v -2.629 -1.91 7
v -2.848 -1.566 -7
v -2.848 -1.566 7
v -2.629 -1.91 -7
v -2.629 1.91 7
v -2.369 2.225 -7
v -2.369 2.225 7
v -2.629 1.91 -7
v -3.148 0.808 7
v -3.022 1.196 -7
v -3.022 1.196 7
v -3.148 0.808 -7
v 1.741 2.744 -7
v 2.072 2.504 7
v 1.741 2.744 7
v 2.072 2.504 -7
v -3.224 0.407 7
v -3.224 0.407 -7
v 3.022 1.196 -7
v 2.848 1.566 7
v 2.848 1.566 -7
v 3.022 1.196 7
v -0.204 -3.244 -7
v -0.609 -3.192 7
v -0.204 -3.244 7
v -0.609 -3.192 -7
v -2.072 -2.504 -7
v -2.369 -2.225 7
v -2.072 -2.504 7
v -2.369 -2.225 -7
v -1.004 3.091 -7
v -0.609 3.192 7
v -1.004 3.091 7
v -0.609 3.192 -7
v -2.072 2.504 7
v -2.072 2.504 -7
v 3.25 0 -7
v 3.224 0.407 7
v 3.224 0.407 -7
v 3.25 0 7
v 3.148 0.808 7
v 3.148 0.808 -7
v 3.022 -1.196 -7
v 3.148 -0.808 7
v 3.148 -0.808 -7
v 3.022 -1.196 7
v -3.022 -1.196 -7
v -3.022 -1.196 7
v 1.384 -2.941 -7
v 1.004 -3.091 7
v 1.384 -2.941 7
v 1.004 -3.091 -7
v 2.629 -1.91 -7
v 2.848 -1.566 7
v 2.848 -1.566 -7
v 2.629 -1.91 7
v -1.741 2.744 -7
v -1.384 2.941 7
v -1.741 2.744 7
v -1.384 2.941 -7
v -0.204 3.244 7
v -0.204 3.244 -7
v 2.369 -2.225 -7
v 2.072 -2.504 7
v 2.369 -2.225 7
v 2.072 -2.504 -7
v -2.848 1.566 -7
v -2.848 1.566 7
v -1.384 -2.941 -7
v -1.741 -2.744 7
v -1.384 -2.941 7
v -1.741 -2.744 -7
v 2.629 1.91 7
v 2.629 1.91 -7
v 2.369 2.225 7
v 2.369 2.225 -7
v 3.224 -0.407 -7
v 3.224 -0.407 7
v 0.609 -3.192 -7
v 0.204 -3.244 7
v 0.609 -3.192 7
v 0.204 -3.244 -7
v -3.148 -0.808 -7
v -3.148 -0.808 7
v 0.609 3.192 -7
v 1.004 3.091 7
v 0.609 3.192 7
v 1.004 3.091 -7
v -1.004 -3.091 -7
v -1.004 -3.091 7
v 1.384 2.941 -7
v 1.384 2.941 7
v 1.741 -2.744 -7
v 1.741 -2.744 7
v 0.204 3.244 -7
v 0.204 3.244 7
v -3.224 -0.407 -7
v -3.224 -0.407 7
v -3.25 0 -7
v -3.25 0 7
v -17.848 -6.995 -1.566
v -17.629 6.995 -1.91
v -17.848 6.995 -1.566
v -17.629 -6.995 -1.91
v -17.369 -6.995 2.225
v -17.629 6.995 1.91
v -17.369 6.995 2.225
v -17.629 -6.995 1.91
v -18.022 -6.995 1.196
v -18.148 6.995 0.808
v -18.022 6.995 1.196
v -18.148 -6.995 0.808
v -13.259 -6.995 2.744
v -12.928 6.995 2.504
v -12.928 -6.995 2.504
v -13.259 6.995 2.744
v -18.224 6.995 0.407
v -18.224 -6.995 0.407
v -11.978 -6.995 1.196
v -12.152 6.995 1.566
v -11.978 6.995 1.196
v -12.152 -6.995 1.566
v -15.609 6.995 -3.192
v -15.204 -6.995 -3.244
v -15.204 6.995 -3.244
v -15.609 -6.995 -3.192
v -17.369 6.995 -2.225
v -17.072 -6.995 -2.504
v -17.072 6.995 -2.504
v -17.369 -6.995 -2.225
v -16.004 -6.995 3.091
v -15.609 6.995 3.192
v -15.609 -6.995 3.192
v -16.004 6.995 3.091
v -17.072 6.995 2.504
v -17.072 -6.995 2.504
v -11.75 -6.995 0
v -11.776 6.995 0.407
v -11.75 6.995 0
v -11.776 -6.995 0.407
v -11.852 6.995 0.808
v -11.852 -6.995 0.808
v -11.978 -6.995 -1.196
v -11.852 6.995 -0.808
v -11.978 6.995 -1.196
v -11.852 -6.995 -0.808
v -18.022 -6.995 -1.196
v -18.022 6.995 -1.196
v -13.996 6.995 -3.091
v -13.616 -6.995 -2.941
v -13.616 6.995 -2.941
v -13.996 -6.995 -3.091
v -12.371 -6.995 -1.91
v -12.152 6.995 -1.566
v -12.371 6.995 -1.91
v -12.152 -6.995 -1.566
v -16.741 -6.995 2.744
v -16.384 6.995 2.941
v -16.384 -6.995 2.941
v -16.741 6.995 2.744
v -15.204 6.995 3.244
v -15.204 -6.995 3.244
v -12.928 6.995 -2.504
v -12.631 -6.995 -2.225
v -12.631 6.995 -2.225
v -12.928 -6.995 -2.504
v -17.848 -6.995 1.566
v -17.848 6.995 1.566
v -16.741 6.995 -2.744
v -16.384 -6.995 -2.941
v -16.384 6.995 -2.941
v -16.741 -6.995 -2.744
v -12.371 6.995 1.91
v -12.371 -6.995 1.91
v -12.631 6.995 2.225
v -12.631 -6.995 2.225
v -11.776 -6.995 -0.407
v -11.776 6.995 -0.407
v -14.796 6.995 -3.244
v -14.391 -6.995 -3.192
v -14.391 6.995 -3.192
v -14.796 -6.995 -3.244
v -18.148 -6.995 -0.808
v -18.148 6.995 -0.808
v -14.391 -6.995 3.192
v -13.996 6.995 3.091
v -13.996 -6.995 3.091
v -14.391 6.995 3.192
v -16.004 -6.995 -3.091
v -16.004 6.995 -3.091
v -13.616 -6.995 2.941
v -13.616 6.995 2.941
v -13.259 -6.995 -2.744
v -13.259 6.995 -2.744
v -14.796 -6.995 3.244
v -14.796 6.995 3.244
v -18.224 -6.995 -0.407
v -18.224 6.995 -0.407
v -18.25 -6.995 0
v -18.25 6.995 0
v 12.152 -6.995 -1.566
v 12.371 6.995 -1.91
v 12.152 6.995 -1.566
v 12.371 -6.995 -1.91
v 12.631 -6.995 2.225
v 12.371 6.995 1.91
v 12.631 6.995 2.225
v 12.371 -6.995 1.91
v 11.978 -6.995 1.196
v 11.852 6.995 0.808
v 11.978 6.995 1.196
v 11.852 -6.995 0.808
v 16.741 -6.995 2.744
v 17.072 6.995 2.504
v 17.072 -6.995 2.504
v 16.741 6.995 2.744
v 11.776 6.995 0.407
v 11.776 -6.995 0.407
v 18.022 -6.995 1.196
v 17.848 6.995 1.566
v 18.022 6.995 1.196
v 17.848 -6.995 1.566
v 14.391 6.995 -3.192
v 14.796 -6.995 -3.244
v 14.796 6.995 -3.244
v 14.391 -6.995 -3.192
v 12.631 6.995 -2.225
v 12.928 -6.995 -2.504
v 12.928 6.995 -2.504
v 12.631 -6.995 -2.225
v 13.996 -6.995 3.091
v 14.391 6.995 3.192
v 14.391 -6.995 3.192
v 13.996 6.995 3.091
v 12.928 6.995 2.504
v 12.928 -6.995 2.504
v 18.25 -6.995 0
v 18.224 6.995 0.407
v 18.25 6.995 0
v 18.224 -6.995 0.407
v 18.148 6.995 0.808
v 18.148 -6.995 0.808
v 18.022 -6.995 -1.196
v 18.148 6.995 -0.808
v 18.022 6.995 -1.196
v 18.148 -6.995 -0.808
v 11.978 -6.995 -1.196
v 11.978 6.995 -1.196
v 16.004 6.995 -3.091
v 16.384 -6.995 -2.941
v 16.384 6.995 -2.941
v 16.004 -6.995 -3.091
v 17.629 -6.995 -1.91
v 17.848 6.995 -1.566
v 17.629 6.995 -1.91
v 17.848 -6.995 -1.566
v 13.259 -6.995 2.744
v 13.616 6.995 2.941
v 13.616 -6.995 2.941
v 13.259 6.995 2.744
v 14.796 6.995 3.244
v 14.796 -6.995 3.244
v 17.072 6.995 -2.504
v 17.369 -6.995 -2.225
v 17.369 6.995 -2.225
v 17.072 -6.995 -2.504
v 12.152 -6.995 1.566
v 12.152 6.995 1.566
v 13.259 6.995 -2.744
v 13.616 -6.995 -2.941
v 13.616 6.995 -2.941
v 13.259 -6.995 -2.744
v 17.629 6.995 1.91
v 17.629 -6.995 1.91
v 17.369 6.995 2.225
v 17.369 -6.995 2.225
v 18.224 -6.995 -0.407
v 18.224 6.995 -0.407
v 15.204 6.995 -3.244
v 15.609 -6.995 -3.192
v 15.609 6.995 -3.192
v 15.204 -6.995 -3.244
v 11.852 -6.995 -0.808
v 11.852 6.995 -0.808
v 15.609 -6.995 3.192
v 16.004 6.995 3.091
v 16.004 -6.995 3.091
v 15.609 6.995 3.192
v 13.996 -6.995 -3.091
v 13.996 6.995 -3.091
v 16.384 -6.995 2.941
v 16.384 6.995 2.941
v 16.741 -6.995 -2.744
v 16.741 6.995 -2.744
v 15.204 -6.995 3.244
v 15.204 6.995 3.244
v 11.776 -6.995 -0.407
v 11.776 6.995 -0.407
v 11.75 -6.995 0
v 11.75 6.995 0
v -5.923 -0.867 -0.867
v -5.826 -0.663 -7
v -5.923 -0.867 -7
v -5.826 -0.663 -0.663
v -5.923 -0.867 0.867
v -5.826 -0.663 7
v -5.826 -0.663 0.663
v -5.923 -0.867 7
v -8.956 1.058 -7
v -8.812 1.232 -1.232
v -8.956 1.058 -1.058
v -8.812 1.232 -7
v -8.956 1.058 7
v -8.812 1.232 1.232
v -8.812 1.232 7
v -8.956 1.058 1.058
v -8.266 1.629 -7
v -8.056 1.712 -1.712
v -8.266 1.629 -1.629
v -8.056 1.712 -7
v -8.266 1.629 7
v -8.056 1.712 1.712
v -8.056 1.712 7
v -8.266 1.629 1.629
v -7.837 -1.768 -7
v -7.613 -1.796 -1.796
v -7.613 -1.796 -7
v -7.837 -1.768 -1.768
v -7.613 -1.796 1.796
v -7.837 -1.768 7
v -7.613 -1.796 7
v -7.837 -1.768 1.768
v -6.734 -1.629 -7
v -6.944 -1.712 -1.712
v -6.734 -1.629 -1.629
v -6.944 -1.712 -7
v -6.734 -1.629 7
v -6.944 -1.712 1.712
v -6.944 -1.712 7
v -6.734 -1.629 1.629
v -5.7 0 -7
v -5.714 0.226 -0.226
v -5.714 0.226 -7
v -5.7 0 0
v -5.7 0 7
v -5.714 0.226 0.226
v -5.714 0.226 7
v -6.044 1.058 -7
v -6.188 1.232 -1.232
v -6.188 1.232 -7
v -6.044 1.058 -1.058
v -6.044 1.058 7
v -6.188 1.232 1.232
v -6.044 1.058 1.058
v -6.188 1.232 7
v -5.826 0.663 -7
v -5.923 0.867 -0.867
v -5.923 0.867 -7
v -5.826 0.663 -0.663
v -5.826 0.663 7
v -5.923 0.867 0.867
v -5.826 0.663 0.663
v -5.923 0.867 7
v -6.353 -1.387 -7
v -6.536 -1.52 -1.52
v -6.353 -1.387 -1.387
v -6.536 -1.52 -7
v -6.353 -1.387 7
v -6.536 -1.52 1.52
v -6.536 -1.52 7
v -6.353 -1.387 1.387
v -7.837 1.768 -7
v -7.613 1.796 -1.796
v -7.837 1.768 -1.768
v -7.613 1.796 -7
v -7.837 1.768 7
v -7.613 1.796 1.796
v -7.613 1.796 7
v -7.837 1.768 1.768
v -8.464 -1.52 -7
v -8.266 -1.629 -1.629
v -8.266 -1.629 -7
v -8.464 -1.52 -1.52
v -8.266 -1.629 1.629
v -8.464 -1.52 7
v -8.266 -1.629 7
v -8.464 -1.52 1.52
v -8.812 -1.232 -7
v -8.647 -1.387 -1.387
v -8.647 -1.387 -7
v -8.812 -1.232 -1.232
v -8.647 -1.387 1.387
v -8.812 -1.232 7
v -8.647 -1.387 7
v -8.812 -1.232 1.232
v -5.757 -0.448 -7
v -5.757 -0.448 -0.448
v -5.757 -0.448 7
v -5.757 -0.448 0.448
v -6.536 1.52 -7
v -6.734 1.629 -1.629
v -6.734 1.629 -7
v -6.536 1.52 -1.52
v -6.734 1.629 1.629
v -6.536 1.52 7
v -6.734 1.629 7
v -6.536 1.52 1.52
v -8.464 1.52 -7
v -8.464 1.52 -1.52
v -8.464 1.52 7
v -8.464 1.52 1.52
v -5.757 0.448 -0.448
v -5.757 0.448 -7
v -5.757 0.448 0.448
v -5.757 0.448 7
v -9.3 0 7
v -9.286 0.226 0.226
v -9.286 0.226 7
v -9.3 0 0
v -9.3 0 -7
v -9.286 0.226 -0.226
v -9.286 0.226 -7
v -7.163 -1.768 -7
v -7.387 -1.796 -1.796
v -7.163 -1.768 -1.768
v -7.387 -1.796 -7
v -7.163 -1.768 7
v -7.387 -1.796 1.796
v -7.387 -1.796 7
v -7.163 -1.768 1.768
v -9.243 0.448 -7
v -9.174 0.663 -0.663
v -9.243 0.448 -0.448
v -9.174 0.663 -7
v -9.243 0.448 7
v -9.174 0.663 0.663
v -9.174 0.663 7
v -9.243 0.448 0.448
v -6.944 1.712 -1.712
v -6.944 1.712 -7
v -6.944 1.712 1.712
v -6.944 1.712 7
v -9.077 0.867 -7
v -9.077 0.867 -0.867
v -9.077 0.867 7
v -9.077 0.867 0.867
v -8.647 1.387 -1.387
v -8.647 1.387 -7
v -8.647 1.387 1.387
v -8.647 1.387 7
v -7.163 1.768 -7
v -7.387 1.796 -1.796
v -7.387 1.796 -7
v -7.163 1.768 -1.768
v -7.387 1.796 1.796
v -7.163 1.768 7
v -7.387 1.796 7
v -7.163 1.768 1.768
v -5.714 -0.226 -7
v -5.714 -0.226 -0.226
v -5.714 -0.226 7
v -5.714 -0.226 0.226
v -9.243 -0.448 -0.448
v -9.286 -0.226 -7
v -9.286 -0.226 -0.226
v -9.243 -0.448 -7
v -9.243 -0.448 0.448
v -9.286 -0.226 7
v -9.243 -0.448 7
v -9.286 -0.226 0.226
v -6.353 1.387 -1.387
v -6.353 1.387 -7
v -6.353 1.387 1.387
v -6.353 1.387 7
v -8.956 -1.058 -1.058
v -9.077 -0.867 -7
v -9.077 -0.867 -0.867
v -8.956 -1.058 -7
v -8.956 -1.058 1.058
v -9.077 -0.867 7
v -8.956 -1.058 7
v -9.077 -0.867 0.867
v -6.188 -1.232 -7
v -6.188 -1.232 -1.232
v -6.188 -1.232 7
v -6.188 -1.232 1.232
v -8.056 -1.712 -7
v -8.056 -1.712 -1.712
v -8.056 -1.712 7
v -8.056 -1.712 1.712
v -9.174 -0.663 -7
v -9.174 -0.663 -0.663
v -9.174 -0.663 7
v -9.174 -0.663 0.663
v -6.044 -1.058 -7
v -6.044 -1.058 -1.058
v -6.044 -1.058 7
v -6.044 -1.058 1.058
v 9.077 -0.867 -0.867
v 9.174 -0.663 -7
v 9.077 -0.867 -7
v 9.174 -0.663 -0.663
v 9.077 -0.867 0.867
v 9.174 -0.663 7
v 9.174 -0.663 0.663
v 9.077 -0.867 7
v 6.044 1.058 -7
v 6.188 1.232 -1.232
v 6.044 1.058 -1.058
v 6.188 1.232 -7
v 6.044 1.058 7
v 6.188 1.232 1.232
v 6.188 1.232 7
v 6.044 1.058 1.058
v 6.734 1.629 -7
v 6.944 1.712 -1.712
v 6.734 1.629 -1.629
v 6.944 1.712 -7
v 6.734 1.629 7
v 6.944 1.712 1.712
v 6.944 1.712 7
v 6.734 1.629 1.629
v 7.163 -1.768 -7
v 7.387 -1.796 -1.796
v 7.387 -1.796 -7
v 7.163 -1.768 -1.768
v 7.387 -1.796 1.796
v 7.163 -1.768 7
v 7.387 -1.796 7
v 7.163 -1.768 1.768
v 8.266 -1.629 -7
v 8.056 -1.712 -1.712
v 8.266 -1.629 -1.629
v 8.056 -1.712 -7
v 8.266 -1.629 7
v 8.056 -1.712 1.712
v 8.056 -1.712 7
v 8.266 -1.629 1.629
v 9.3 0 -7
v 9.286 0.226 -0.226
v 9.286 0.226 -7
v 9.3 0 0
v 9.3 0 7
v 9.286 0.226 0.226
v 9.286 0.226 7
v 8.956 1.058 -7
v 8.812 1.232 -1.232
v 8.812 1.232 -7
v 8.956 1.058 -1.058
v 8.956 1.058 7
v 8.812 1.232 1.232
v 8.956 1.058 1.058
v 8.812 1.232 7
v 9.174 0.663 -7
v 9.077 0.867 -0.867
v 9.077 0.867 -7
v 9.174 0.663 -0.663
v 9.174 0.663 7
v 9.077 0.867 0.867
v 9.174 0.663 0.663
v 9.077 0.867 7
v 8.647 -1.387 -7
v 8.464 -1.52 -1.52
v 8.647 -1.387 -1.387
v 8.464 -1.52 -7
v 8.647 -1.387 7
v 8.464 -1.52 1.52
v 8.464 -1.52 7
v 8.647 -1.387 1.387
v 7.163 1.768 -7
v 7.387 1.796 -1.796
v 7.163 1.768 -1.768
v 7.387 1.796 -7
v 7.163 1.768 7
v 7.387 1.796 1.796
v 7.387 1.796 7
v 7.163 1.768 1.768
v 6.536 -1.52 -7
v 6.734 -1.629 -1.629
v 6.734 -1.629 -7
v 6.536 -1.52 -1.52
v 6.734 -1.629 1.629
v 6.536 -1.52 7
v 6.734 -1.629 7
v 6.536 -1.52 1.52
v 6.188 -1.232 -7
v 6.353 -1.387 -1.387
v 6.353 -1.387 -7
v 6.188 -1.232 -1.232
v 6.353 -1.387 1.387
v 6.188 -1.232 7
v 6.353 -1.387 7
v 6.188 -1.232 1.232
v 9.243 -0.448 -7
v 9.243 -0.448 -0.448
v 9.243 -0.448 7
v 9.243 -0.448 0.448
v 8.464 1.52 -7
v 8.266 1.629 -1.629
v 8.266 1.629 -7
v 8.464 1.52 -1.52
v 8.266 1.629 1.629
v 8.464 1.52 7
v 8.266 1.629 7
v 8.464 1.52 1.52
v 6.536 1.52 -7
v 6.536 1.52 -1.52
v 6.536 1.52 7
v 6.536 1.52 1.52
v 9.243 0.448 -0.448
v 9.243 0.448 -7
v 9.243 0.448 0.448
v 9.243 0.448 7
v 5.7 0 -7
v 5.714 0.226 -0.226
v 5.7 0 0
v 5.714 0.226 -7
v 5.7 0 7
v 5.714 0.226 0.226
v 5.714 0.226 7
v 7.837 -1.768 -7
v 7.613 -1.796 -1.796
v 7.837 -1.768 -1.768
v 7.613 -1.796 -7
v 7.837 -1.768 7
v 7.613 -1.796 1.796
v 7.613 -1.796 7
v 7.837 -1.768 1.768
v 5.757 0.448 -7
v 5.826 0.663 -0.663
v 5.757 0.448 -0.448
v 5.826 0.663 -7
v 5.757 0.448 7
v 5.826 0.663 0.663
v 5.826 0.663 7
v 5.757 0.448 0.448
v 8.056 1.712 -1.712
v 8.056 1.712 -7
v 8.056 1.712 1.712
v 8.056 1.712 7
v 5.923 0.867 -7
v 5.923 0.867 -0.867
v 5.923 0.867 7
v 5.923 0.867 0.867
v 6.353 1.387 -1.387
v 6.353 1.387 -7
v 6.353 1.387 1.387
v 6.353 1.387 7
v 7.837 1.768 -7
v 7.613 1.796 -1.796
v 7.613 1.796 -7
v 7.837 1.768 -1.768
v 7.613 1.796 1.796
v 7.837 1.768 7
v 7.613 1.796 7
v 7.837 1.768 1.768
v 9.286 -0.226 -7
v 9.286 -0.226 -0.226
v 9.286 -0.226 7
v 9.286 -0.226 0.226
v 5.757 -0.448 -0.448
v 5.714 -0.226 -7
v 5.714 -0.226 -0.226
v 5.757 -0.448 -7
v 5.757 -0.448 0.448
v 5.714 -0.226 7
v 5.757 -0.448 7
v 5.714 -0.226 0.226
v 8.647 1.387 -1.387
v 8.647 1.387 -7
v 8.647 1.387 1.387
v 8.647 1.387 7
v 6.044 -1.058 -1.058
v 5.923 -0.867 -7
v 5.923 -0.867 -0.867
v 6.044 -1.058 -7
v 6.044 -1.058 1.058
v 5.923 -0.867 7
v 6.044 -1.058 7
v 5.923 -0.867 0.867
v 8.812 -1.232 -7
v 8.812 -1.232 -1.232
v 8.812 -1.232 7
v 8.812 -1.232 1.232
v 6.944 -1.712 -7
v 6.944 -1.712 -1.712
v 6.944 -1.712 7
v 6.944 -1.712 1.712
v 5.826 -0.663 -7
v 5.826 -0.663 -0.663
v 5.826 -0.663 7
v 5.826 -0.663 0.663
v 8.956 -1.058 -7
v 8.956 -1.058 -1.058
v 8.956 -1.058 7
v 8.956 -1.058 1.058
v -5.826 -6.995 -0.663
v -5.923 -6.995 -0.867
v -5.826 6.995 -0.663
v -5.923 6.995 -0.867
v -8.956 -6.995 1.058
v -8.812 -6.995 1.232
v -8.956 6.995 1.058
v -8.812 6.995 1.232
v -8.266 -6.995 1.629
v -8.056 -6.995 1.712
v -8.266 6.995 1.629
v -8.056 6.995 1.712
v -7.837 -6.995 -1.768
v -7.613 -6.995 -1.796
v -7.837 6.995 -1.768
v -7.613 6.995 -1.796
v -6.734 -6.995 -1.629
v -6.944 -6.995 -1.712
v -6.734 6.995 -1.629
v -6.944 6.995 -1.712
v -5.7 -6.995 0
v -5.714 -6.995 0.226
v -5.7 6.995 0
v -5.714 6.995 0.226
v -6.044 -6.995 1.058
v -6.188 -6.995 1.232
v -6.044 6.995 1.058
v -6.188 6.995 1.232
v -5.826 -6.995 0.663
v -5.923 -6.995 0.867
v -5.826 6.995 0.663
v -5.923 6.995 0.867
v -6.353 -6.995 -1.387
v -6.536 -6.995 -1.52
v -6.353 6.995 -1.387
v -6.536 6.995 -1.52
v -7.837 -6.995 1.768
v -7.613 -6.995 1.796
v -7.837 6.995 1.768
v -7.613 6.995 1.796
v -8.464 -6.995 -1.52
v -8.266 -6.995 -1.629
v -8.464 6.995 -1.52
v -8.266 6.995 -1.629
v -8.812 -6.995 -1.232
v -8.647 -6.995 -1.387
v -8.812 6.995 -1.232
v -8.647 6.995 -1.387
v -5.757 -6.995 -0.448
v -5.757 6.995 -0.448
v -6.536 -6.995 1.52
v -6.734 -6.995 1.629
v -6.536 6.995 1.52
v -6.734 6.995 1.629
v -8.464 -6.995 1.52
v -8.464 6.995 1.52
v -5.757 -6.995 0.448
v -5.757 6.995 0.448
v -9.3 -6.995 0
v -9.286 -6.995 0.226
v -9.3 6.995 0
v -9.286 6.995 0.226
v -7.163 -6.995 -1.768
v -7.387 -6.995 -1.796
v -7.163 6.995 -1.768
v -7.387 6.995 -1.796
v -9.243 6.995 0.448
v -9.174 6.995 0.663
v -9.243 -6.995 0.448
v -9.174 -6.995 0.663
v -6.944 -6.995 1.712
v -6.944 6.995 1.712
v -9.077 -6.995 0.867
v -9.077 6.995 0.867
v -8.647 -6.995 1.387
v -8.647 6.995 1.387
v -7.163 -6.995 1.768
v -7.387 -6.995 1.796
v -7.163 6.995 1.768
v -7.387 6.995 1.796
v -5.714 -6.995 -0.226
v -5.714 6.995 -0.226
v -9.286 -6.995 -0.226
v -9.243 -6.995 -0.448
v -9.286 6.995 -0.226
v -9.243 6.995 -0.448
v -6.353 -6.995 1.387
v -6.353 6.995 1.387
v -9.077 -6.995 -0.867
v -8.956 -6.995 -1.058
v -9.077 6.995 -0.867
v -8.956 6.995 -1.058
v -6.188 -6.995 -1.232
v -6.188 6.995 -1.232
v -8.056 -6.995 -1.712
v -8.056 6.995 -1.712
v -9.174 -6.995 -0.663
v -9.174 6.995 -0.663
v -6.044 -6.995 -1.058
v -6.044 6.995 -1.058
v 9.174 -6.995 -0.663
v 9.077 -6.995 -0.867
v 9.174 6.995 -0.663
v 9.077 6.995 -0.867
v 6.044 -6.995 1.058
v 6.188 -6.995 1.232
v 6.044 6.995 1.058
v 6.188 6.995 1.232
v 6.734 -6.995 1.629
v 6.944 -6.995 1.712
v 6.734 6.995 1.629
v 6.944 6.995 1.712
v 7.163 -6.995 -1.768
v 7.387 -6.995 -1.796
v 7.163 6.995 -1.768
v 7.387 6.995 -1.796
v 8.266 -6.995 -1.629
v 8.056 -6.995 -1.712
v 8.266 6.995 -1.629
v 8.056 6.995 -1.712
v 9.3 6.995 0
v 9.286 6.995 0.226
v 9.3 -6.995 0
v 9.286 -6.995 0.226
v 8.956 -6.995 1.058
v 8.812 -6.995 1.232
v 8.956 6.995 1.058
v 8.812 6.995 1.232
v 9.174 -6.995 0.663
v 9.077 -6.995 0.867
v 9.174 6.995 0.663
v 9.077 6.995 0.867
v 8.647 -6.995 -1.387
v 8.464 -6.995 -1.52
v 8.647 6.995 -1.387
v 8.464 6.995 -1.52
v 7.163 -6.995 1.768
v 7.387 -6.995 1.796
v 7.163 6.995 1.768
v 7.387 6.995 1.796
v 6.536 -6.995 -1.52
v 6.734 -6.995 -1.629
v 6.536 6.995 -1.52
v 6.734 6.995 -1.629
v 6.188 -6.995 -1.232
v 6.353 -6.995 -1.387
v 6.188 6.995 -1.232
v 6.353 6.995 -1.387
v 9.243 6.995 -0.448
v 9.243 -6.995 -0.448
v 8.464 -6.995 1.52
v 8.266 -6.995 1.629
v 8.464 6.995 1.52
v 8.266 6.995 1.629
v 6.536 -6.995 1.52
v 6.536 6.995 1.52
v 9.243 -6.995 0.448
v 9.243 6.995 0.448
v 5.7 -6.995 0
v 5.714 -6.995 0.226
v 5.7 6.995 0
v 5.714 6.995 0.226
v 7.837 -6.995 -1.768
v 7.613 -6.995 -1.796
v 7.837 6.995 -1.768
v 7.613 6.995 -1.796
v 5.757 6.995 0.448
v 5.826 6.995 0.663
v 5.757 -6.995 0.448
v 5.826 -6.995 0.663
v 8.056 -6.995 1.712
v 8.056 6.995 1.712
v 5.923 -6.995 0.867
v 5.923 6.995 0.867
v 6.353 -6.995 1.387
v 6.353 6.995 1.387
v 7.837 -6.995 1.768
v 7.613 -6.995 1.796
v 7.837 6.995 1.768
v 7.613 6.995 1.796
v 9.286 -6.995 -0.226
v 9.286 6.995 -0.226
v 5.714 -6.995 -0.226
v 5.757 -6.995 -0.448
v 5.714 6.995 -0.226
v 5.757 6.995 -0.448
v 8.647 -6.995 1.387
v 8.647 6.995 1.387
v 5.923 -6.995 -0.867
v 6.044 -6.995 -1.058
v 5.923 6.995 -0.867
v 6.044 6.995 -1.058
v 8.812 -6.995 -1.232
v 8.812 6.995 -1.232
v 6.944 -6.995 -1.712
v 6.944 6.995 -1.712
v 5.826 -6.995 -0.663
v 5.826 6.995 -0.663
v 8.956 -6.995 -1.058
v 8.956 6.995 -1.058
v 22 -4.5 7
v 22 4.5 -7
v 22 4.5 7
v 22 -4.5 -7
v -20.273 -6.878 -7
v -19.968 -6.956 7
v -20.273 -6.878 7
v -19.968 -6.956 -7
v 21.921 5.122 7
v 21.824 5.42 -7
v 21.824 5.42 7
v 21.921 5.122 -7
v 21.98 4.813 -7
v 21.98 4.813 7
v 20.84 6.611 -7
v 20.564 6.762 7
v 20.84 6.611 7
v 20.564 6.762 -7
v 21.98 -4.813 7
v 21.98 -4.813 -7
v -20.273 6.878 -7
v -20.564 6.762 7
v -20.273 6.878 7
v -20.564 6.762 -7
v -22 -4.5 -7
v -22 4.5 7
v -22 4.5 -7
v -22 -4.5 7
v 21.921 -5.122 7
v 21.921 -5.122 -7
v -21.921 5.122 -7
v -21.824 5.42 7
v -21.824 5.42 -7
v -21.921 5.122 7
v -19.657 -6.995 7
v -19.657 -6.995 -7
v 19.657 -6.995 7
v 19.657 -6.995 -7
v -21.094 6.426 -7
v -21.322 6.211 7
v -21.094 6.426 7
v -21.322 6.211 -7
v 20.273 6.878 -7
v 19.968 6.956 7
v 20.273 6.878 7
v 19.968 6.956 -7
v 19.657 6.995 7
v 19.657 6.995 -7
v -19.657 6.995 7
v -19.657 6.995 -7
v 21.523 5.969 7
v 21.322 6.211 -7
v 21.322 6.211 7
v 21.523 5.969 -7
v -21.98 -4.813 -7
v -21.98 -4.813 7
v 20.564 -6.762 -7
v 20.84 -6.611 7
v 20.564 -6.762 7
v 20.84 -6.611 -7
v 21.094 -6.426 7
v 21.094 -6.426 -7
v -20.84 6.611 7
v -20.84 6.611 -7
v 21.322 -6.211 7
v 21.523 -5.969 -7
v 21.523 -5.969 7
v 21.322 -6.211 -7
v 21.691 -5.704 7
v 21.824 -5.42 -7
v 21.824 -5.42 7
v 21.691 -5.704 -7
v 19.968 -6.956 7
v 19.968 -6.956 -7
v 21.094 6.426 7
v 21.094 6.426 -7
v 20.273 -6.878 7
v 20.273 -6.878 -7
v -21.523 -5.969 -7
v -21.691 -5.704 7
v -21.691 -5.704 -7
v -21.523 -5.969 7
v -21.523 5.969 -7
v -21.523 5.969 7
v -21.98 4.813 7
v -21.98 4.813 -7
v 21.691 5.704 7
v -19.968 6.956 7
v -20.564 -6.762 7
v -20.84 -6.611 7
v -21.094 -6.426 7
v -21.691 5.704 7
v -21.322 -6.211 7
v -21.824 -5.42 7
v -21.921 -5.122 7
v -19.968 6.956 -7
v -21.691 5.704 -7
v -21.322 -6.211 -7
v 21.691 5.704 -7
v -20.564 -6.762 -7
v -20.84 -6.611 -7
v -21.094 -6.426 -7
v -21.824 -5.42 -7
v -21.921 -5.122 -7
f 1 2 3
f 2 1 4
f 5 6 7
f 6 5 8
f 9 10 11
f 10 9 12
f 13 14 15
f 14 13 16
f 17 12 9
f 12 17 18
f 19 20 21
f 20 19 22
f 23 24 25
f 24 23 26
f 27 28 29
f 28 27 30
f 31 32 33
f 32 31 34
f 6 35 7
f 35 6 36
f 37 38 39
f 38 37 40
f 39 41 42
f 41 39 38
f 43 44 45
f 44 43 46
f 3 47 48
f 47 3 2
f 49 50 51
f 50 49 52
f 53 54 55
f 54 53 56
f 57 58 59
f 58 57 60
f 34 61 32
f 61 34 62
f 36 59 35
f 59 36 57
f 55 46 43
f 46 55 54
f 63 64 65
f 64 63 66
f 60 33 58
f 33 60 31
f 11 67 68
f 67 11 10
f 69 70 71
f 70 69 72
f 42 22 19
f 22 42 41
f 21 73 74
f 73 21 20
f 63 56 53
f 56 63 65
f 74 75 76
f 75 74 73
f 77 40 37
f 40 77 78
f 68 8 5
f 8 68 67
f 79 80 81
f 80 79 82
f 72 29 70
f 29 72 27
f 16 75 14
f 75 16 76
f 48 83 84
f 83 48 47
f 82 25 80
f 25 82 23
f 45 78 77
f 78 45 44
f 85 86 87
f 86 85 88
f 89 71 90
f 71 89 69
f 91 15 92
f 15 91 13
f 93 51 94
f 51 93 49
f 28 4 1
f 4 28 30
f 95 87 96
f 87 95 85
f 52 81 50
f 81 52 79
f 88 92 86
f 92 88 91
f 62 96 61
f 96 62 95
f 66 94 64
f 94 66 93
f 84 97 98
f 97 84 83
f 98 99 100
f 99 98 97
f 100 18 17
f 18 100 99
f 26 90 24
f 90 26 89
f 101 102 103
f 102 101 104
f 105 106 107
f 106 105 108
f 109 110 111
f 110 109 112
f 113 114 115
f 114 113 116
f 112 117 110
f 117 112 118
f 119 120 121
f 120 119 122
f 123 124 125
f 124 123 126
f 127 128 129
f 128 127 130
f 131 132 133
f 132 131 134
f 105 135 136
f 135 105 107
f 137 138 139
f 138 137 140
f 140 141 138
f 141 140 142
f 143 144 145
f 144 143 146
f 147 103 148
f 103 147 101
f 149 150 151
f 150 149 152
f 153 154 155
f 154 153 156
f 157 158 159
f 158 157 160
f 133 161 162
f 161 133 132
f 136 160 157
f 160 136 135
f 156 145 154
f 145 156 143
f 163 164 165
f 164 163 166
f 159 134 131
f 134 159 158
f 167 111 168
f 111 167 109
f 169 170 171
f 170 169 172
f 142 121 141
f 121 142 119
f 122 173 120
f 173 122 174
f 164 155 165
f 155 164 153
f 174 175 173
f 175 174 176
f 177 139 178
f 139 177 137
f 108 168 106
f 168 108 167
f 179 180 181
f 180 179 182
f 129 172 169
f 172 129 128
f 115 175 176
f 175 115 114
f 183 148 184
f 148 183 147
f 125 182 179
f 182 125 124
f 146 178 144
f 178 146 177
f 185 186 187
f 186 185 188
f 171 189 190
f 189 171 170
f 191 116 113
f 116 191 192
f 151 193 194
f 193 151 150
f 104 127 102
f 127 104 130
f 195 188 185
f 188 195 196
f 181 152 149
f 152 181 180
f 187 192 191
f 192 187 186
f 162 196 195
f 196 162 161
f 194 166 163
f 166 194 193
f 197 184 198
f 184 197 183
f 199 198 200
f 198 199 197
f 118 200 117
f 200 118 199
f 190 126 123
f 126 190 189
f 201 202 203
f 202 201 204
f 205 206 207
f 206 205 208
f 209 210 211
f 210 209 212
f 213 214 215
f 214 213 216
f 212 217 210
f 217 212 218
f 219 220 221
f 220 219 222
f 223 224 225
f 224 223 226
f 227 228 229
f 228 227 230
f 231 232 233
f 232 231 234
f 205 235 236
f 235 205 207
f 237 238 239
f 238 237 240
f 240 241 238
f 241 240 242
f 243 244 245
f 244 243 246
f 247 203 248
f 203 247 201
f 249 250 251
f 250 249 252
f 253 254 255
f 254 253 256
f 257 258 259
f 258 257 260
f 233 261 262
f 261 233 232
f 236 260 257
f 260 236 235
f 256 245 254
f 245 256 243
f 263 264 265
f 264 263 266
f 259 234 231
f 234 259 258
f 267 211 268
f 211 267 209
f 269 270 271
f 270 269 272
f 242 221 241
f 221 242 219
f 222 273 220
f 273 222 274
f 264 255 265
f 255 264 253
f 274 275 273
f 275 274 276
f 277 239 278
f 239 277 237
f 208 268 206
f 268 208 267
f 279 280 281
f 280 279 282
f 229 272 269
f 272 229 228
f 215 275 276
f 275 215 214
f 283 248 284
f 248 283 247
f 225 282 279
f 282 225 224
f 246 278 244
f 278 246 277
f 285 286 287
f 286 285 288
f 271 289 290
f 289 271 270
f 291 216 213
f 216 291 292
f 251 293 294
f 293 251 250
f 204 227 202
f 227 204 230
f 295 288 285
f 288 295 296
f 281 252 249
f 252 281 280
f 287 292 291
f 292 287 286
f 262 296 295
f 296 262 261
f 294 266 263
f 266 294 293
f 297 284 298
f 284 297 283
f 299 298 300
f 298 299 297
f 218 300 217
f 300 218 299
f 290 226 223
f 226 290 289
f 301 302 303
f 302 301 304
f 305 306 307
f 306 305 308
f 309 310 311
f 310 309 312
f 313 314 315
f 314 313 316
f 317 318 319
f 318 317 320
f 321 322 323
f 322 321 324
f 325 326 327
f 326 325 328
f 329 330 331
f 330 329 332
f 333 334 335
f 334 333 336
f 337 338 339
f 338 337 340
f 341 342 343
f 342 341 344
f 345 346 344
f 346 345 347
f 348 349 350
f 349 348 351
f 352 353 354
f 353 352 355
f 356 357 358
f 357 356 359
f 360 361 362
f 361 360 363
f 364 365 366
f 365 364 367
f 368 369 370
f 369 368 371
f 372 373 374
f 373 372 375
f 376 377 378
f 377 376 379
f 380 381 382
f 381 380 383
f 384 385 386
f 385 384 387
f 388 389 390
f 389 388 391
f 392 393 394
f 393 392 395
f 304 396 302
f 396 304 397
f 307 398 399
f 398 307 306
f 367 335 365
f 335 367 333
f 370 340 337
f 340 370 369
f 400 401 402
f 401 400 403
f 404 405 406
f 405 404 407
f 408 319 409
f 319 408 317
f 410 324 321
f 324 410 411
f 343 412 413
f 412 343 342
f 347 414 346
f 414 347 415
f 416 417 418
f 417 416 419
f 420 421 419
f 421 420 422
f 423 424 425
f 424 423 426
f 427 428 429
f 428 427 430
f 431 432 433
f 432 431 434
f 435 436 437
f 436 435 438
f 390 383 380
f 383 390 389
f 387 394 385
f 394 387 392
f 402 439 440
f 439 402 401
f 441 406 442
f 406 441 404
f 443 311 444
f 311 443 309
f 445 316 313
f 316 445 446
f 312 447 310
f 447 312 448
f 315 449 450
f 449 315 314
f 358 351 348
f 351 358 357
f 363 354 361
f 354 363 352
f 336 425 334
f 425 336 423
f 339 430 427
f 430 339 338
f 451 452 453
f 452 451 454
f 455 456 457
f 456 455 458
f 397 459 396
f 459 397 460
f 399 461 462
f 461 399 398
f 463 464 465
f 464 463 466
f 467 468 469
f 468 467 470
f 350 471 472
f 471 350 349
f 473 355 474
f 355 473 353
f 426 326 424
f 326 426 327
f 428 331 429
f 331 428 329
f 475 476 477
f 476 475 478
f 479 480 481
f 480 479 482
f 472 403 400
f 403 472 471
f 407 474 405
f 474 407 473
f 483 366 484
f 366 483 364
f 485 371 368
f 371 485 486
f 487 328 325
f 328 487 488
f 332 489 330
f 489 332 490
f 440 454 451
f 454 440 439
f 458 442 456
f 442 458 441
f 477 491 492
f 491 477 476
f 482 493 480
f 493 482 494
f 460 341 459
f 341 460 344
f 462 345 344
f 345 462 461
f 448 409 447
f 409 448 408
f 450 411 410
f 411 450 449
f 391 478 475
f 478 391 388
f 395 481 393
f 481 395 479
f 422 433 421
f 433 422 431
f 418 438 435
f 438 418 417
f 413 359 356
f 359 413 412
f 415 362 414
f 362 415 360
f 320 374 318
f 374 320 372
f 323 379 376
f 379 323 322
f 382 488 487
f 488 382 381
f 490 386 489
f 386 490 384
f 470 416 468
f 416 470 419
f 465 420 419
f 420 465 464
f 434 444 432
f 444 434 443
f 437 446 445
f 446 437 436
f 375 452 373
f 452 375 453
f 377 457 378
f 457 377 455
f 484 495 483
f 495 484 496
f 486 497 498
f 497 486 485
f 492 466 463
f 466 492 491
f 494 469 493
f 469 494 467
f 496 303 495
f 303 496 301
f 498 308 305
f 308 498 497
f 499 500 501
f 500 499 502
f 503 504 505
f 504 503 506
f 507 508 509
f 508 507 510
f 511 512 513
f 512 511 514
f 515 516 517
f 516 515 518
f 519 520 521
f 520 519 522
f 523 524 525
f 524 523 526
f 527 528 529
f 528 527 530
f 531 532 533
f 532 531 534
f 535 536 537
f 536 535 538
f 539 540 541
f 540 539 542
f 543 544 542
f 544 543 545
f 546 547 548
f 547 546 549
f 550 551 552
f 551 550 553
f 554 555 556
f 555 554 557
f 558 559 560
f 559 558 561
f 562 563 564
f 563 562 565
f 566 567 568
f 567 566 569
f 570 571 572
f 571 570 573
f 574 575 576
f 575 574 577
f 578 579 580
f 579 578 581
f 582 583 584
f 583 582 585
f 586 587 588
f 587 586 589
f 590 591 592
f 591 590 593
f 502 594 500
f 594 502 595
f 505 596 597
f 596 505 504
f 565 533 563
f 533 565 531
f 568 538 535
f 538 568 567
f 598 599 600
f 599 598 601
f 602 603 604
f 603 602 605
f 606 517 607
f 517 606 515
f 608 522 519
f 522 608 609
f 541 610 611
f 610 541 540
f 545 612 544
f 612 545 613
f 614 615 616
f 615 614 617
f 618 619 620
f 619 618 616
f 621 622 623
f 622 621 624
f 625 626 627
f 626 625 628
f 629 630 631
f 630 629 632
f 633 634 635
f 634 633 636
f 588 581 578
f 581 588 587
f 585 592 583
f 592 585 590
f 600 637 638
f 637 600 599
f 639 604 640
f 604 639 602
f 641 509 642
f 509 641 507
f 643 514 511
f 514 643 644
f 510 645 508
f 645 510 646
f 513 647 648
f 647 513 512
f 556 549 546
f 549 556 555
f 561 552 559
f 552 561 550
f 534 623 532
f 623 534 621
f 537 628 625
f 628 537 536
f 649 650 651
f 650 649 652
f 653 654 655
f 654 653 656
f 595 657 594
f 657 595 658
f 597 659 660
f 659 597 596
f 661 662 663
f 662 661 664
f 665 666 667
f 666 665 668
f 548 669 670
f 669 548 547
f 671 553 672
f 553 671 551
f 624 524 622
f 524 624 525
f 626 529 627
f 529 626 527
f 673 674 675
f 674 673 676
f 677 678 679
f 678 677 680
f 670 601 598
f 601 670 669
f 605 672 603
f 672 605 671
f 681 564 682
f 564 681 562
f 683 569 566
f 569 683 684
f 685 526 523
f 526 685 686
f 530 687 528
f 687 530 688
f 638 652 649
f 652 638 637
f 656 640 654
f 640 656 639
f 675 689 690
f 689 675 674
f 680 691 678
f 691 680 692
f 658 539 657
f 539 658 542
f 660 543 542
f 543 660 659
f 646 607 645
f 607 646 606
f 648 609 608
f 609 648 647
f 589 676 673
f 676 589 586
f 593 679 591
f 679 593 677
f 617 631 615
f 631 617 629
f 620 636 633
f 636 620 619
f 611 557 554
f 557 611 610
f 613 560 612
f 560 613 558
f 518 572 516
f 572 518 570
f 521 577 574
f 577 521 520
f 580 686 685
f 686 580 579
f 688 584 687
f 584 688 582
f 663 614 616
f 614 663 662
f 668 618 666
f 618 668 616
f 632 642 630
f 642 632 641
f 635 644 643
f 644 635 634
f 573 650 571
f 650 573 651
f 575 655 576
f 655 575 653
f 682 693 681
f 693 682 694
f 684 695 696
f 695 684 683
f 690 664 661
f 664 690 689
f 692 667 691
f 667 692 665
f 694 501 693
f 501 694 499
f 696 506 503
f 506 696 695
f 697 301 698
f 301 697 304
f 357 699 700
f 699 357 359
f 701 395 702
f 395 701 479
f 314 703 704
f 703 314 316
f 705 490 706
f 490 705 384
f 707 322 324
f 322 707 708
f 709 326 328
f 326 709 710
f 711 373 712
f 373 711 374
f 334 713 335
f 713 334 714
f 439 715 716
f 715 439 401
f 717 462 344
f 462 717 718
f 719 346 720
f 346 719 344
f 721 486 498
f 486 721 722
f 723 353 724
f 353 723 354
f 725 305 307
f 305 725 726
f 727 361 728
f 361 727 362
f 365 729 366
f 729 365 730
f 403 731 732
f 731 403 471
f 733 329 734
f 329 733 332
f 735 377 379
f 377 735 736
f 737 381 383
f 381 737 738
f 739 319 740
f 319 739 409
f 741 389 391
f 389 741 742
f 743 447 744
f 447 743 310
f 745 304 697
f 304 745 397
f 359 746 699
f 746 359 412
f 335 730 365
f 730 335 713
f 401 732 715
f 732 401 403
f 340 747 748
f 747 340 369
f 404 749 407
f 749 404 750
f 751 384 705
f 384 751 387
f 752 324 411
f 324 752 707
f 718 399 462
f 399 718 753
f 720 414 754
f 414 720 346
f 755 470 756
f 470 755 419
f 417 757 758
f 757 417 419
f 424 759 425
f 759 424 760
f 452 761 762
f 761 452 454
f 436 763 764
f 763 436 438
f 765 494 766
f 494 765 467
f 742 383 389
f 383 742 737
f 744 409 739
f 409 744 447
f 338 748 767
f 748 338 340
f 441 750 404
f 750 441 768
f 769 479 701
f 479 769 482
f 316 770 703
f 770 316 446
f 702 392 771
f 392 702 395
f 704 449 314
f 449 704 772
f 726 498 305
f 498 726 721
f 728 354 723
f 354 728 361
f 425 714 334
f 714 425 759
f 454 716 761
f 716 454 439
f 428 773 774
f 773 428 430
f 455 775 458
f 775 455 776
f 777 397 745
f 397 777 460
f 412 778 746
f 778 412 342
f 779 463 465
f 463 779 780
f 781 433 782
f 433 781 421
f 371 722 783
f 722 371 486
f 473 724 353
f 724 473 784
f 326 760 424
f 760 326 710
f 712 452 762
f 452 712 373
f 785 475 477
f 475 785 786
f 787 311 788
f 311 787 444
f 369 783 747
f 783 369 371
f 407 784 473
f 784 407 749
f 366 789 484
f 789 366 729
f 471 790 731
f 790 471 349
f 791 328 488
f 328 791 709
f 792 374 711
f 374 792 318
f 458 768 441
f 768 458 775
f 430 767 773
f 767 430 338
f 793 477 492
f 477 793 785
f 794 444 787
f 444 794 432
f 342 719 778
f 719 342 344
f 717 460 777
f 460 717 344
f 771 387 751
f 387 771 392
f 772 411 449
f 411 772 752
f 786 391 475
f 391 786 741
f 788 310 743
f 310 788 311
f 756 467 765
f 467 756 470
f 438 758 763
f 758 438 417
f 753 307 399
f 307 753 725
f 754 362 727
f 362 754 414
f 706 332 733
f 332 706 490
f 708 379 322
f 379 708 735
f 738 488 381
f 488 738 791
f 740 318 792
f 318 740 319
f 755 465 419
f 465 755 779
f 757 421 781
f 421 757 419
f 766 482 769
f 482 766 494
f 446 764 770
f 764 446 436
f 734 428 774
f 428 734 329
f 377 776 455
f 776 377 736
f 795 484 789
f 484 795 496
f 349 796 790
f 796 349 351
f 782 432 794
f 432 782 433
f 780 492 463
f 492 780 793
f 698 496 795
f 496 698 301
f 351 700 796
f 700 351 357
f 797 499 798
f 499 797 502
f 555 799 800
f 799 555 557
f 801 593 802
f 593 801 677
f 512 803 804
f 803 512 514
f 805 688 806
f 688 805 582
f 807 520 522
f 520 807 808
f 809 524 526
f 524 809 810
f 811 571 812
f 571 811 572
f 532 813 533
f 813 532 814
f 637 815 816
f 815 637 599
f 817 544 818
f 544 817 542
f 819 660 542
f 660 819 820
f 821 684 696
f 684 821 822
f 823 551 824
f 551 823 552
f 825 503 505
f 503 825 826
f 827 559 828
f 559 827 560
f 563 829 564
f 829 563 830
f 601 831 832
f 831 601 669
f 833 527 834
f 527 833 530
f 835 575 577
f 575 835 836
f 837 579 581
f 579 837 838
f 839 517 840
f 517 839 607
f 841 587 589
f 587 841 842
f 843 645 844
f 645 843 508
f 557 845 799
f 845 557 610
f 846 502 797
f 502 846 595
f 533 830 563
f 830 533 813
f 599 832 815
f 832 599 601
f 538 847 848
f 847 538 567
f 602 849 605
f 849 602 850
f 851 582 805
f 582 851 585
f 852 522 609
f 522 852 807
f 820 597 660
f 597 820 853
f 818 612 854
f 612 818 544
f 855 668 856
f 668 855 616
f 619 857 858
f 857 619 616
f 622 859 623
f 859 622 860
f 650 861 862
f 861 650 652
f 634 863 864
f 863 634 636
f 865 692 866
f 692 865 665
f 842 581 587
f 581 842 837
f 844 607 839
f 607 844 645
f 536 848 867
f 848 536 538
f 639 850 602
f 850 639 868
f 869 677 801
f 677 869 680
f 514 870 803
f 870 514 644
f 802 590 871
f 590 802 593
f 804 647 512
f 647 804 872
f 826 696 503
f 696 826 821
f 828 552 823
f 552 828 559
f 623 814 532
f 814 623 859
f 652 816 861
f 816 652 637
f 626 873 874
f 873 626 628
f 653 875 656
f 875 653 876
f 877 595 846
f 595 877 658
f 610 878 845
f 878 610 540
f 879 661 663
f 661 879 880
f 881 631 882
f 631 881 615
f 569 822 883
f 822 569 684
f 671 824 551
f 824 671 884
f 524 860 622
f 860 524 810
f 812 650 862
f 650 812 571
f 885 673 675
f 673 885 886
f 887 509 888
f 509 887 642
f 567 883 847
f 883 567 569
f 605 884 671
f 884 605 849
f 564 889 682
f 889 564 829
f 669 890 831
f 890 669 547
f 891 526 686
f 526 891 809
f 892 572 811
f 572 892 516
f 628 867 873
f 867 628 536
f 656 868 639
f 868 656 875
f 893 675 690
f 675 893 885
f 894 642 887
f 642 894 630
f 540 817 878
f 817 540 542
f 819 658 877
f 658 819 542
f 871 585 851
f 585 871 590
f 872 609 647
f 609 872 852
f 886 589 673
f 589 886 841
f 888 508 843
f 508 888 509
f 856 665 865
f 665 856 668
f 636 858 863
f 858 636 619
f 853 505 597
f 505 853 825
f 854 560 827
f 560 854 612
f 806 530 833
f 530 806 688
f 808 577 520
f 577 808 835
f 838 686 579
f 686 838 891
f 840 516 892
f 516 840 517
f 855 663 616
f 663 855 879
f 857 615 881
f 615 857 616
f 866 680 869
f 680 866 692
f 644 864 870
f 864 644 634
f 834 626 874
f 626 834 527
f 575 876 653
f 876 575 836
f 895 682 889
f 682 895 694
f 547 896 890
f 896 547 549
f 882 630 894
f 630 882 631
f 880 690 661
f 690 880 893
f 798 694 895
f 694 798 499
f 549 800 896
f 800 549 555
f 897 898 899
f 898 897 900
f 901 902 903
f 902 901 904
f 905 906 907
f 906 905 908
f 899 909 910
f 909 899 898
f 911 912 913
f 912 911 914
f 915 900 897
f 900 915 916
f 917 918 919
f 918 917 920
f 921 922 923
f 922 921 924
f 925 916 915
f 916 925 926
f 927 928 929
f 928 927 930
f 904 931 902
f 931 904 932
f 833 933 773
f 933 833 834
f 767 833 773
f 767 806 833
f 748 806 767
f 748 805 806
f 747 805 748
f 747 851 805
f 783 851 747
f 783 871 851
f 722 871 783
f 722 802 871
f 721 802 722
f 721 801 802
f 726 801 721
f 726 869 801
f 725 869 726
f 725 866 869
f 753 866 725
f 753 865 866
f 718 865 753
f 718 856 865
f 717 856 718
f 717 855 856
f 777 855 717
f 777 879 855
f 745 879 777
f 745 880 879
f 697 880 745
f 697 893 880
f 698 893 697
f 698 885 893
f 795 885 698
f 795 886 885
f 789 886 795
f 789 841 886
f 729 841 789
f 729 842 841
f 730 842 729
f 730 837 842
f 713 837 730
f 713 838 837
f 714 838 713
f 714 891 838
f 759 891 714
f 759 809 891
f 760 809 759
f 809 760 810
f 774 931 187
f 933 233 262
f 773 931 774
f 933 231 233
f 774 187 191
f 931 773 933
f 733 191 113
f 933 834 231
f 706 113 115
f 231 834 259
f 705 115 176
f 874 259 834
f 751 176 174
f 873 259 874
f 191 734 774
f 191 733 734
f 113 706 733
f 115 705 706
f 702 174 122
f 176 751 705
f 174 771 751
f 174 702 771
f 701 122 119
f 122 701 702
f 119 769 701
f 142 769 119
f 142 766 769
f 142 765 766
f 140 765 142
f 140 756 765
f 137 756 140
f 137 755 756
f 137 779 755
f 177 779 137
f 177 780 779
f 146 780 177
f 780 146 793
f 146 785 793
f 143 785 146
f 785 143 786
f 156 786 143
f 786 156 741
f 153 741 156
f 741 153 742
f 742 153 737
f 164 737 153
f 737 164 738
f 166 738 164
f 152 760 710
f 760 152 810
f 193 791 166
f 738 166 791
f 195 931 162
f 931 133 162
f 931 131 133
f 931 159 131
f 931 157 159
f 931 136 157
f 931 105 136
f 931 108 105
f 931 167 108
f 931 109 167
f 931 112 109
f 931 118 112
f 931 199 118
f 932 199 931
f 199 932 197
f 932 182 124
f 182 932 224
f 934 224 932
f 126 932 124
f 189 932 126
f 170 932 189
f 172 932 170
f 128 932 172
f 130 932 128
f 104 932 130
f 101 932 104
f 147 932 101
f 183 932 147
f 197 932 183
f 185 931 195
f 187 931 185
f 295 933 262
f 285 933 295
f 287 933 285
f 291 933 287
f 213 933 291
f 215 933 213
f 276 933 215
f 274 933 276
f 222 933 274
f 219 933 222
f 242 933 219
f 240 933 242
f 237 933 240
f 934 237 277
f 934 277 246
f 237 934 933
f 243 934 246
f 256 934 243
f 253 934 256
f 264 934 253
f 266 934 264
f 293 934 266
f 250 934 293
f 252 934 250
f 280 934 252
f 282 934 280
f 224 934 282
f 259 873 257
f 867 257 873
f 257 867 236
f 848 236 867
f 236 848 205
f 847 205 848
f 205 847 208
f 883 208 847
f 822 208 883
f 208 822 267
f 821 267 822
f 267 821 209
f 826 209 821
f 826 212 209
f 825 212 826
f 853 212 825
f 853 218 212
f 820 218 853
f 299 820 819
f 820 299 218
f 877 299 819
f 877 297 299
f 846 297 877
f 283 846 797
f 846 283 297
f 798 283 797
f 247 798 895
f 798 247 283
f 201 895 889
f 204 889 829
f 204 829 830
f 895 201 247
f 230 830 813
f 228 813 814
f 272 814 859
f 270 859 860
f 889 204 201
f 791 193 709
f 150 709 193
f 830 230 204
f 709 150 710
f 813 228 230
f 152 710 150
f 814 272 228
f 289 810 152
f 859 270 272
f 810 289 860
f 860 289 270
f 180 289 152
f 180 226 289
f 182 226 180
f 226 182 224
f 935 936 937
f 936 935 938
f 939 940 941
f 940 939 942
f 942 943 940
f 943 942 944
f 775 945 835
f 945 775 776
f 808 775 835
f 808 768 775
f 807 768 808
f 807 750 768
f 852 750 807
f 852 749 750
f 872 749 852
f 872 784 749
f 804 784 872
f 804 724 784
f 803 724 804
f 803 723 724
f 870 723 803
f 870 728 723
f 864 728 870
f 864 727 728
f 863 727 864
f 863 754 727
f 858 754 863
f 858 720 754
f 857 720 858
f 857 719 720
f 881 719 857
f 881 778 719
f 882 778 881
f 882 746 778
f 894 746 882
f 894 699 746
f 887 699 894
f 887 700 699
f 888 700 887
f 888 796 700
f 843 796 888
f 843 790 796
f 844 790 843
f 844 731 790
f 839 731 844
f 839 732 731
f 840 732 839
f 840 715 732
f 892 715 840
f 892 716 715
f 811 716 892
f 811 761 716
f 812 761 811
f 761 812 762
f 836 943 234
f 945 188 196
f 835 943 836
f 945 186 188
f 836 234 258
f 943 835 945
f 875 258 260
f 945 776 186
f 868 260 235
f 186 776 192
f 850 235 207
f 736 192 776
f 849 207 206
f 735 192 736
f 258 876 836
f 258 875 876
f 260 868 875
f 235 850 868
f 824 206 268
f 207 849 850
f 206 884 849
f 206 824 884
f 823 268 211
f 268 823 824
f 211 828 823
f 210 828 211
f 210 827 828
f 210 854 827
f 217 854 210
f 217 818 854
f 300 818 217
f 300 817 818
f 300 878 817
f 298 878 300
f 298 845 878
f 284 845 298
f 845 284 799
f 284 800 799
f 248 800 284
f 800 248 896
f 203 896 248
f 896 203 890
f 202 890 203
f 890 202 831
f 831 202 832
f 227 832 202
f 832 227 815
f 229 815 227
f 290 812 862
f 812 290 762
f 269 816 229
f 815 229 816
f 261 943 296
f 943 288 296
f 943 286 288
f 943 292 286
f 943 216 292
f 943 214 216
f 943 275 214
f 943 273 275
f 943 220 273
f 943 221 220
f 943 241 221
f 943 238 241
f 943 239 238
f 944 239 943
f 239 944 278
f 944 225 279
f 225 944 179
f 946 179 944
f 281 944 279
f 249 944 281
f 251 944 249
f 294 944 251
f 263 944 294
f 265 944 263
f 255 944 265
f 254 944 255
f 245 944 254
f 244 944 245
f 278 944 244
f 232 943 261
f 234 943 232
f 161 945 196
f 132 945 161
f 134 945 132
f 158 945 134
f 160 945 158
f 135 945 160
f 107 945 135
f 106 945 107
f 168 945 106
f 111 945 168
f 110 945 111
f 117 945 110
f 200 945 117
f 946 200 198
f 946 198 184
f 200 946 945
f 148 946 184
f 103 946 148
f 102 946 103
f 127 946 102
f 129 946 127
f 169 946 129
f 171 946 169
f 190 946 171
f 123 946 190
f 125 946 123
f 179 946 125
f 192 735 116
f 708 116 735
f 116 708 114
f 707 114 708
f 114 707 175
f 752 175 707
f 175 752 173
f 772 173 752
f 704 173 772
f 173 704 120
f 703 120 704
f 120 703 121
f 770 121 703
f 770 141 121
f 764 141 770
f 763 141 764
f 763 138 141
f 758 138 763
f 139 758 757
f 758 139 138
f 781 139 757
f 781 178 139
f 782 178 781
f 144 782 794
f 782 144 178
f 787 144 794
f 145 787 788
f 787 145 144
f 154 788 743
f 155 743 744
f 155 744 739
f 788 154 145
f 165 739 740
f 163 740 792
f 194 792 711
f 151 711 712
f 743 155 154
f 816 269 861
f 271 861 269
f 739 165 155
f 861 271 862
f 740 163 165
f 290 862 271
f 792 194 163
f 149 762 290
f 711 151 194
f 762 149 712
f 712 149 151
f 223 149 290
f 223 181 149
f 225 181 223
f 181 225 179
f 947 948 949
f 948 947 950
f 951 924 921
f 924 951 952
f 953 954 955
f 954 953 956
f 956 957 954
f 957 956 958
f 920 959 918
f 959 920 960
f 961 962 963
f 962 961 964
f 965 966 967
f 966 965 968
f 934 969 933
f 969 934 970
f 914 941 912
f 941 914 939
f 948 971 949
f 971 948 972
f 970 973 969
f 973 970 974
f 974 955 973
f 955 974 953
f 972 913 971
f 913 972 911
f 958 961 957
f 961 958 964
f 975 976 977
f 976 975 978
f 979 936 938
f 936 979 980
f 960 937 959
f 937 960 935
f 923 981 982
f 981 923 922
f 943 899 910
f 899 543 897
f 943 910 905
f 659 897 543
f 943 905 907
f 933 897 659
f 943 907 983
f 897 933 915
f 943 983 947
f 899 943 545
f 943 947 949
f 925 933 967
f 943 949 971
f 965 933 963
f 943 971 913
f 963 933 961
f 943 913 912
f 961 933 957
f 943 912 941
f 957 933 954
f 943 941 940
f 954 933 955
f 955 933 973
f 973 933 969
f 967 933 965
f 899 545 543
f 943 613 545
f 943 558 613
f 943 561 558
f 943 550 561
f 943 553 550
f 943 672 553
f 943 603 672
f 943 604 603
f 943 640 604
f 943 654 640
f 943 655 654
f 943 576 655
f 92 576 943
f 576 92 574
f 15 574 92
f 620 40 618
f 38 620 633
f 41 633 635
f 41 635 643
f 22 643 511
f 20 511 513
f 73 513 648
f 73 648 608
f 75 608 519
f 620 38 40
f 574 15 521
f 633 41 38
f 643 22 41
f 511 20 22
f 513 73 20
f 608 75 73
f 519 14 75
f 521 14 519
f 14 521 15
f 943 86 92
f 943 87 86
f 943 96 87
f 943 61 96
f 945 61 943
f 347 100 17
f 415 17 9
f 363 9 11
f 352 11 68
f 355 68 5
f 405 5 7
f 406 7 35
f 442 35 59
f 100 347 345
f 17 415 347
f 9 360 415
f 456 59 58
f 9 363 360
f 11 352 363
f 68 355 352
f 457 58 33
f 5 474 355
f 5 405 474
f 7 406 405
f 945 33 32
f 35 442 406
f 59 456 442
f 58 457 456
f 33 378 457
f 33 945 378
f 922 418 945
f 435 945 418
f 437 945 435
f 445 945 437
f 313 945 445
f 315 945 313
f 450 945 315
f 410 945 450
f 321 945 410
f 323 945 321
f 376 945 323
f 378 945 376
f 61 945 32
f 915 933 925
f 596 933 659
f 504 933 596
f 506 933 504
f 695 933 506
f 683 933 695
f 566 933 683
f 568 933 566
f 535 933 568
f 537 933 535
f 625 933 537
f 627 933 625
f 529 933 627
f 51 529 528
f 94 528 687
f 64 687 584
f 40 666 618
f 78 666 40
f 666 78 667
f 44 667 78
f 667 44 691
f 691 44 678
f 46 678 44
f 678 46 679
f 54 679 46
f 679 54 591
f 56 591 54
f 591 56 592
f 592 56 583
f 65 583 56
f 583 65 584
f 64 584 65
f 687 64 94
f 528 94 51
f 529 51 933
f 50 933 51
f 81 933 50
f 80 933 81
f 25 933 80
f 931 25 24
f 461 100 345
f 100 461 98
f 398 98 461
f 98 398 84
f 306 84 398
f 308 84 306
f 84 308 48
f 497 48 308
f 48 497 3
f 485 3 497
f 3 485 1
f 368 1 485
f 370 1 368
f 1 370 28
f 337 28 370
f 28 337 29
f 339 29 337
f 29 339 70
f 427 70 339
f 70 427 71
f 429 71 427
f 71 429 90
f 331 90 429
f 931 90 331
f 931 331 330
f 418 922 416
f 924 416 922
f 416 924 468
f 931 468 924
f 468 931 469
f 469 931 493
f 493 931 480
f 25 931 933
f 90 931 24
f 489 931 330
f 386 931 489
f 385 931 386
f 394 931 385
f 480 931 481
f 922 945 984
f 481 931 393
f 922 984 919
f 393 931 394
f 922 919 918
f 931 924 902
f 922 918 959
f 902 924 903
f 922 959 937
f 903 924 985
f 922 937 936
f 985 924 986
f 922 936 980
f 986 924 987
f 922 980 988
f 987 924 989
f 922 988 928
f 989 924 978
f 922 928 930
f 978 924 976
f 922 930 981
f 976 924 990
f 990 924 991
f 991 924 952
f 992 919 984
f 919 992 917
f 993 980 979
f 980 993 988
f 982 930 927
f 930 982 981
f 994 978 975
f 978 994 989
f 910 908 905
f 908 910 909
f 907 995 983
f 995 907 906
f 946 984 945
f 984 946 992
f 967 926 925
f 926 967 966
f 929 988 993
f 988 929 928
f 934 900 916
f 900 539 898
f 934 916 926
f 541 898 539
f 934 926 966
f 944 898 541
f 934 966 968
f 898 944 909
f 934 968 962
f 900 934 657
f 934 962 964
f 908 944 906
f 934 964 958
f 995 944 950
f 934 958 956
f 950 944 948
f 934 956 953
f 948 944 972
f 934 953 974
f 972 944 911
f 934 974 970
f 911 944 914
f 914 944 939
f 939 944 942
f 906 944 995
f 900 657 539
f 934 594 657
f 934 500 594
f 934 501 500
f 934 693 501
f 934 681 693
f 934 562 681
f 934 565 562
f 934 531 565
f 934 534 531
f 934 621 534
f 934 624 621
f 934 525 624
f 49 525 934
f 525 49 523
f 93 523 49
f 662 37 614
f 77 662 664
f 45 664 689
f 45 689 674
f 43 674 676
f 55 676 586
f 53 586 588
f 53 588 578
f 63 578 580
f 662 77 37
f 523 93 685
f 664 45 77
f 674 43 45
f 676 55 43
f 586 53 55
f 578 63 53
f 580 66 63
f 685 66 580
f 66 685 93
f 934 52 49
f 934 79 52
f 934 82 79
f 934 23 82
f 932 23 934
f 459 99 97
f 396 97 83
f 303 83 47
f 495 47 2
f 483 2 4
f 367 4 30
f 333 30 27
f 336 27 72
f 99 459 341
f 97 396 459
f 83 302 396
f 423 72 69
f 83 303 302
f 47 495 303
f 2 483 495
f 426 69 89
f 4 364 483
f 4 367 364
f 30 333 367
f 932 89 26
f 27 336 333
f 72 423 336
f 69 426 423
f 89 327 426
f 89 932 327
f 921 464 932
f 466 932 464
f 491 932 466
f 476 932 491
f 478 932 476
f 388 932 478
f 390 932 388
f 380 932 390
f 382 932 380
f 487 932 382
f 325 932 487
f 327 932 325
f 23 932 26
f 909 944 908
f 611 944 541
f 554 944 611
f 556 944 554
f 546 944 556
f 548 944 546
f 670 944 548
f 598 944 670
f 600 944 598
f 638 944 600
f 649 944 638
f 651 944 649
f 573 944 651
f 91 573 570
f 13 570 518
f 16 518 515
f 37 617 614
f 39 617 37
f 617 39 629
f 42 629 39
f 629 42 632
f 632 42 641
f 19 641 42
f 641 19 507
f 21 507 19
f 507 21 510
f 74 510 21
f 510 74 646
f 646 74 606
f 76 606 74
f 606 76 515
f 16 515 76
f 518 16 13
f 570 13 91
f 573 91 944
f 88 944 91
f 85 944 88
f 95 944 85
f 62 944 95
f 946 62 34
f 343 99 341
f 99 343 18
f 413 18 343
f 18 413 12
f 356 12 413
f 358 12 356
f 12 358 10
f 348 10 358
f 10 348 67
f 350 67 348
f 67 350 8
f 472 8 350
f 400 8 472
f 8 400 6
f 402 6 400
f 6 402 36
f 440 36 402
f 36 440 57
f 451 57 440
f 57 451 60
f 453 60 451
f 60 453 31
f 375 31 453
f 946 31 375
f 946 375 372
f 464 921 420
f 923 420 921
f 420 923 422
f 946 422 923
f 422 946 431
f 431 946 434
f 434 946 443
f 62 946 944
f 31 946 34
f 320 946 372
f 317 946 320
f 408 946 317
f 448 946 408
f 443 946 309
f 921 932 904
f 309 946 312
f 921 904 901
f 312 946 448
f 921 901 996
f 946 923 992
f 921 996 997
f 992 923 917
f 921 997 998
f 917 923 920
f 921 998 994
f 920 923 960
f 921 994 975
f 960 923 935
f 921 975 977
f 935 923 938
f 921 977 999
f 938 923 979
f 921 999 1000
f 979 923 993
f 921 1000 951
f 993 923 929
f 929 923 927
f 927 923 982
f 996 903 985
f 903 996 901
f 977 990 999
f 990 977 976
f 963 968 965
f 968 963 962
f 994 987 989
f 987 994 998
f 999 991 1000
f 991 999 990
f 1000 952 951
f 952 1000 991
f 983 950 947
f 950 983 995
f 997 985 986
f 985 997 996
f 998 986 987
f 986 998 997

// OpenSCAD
$fn = 50;


difference() {
	union() {
		*color(alpha = 1.0000000000, c = "gray") {
			translate(v = [0, 7, 0]) {
				linear_extrude(height = 1) {
					text(font = "Arial:style=Bold", halign = "center", size = 4.5000000000, text = "COMMENT plate main", valign = "center");
				}
			}
		}
		translate(v = [0, 0, -7.0000000000]) {
			hull() {
				translate(v = [-19.5000000000, 4.5000000000, 0]) {
					cylinder(h = 14, r = 2.5000000000);
				}
				translate(v = [19.5000000000, 4.5000000000, 0]) {
					cylinder(h = 14, r = 2.5000000000);
				}
				translate(v = [-19.5000000000, -4.5000000000, 0]) {
					cylinder(h = 14, r = 2.5000000000);
				}
				translate(v = [19.5000000000, -4.5000000000, 0]) {
					cylinder(h = 14, r = 2.5000000000);
				}
			}
		}
	}
	union() {
		translate(v = [0.0000000000, 0.0000000000, 0.0000000000]) {
			rotate(a = [0, 0, 0]) {
				difference() {
					union() {
						translate(v = [0, 0, -125.0000000000]) {
							cylinder(h = 250, r = 3.2500000000);
						}
					}
					union();
				}
			}
		}
		translate(v = [-15.0000000000, 0.0000000000, 0.0000000000]) {
			rotate(a = [90, 0, 0]) {
				difference() {
					union() {
						translate(v = [0, 0, -125.0000000000]) {
							cylinder(h = 250, r = 3.2500000000);
						}
					}
					union();
				}
			}
		}
		translate(v = [15.0000000000, 0.0000000000, 0.0000000000]) {
			rotate(a = [90, 0, 0]) {
				difference() {
					union() {
						translate(v = [0, 0, -125.0000000000]) {
							cylinder(h = 250, r = 3.2500000000);
						}
					}
					union();
				}
			}
		}
		translate(v = [-7.5000000000, 0.0000000000, 0.0000000000]) {
			rotate(a = [0, 0, 0]) {
				difference() {
					union() {
						translate(v = [0, 0, -125.0000000000]) {
							cylinder(h = 250, r = 1.8000000000);
						}
					}
					union();
				}
			}
		}
		translate(v = [7.5000000000, 0.0000000000, 0.0000000000]) {
			rotate(a = [0, 0, 0]) {
				difference() {
					union() {
						translate(v = [0, 0, -125.0000000000]) {
							cylinder(h = 250, r = 1.8000000000);
						}
					}
					union();
				}
			}
		}
		translate(v = [-7.5000000000, 0.0000000000, 0.0000000000]) {
			rotate(a = [90, 0, 0]) {
				difference() {
					union() {
						translate(v = [0, 0, -125.0000000000]) {
							cylinder(h = 250, r = 1.8000000000);
						}
					}
					union();
				}
			}
		}
		translate(v = [7.5000000000, 0.0000000000, 0.0000000000]) {
			rotate(a = [90, 0, 0]) {
				difference() {
					union() {
						translate(v = [0, 0, -125.0000000000]) {
							cylinder(h = 250, r = 1.8000000000);
						}
					}
					union();
				}
			}
		}
	}
}
